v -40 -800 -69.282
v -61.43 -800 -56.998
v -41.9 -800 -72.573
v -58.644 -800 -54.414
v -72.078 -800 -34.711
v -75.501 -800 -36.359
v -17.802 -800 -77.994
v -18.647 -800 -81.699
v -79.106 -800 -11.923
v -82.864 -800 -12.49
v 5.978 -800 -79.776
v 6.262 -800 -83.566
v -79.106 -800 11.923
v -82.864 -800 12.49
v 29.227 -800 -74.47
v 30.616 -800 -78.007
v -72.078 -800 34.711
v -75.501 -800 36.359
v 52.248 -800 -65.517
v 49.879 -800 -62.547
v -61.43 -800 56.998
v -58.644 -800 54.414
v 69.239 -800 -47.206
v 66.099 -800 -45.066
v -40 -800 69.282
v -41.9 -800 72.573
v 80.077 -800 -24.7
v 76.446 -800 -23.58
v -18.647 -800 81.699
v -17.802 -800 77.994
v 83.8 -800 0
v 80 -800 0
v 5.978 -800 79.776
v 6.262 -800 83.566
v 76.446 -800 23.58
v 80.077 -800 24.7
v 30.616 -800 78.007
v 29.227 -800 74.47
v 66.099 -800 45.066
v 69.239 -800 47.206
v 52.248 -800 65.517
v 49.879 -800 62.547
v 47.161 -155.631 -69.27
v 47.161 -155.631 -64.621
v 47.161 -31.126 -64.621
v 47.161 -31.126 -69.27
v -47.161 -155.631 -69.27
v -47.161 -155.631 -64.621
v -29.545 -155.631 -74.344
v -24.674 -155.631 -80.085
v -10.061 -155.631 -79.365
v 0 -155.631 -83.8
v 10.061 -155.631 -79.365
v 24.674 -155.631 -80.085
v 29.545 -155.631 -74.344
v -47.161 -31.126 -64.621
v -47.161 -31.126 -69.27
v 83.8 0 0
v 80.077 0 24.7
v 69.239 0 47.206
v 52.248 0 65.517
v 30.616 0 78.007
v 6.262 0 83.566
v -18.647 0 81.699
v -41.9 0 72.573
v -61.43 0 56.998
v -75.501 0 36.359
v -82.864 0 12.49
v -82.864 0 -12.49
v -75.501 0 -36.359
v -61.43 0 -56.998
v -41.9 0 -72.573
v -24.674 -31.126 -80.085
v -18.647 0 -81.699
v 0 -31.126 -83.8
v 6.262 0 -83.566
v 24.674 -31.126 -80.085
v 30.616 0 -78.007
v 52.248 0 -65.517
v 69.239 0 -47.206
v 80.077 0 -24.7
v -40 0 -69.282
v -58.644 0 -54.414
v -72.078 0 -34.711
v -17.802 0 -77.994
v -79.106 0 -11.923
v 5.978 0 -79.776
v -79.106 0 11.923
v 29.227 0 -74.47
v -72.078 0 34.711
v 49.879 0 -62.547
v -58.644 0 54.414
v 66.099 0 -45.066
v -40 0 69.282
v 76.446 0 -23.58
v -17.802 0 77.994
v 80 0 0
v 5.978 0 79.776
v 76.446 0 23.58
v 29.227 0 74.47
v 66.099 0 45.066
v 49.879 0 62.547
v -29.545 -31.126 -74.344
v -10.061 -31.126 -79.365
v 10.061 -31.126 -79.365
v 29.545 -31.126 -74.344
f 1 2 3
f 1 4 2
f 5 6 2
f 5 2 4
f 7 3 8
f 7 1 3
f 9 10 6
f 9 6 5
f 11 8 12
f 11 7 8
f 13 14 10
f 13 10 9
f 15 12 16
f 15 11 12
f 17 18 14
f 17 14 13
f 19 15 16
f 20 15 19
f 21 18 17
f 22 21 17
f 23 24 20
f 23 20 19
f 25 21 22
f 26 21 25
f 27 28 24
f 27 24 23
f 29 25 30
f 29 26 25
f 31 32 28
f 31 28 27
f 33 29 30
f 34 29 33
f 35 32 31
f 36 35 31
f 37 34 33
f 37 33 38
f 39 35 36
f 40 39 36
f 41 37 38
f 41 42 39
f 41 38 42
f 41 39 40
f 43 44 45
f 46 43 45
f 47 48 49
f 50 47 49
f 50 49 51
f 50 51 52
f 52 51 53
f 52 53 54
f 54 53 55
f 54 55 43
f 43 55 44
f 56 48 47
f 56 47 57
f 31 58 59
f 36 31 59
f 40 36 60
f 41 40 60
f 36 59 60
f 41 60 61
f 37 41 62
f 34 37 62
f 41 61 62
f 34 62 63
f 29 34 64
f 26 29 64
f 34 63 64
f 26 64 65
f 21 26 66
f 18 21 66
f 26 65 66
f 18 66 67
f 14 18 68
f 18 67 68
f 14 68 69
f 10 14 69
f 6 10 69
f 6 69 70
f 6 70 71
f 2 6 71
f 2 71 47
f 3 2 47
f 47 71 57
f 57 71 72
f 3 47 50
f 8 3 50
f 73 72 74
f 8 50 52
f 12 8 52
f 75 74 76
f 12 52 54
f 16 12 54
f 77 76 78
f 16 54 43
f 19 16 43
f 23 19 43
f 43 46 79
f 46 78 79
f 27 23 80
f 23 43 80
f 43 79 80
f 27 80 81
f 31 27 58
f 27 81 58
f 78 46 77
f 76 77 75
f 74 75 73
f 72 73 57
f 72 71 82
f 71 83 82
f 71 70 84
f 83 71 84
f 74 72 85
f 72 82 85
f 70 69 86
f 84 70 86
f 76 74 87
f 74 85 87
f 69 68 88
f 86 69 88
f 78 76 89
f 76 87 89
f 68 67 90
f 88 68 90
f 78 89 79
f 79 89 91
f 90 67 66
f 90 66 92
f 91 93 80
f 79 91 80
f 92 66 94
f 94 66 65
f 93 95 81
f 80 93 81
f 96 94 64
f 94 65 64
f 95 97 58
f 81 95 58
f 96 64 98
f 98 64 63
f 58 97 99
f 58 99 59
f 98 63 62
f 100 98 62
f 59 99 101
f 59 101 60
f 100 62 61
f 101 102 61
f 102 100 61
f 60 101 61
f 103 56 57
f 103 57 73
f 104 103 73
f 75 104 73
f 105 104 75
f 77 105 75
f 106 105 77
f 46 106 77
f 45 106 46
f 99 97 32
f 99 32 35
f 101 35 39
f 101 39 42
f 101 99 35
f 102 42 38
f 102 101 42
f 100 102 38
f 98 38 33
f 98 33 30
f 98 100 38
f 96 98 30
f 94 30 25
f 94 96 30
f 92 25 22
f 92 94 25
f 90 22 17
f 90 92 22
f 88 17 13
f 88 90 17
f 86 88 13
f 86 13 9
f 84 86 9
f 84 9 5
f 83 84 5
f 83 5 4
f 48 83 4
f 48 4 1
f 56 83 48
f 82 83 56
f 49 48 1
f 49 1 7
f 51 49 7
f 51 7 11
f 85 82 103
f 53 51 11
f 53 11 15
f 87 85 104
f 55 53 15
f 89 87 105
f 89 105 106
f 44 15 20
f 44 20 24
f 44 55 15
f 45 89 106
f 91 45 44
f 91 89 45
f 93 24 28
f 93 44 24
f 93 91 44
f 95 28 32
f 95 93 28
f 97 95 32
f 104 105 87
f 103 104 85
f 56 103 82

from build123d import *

# Parameters (mm, degrees)
F0_R     = 83.8
F0_R_2   = 80
F1_DEPTH = 800
F2_W     = 94.3220257759
F2_H     = 124.5050393045
F3_DEPTH = 84.8


with BuildPart() as f1:
    # F0 (on Front) → F1 (new body)
    with BuildSketch(Plane.XZ):
        Circle(F0_R)
        Circle(F0_R_2, mode=Mode.SUBTRACT)
    extrude(amount=F1_DEPTH)

    # F2 (on Top) → F3 (cut, up to face)
    with BuildSketch(Plane.XY):
        with Locations((0, -93.3787897229)):
            Rectangle(F2_W, F2_H)
    extrude(amount=-F3_DEPTH, mode=Mode.SUBTRACT)


solid = f1.part
